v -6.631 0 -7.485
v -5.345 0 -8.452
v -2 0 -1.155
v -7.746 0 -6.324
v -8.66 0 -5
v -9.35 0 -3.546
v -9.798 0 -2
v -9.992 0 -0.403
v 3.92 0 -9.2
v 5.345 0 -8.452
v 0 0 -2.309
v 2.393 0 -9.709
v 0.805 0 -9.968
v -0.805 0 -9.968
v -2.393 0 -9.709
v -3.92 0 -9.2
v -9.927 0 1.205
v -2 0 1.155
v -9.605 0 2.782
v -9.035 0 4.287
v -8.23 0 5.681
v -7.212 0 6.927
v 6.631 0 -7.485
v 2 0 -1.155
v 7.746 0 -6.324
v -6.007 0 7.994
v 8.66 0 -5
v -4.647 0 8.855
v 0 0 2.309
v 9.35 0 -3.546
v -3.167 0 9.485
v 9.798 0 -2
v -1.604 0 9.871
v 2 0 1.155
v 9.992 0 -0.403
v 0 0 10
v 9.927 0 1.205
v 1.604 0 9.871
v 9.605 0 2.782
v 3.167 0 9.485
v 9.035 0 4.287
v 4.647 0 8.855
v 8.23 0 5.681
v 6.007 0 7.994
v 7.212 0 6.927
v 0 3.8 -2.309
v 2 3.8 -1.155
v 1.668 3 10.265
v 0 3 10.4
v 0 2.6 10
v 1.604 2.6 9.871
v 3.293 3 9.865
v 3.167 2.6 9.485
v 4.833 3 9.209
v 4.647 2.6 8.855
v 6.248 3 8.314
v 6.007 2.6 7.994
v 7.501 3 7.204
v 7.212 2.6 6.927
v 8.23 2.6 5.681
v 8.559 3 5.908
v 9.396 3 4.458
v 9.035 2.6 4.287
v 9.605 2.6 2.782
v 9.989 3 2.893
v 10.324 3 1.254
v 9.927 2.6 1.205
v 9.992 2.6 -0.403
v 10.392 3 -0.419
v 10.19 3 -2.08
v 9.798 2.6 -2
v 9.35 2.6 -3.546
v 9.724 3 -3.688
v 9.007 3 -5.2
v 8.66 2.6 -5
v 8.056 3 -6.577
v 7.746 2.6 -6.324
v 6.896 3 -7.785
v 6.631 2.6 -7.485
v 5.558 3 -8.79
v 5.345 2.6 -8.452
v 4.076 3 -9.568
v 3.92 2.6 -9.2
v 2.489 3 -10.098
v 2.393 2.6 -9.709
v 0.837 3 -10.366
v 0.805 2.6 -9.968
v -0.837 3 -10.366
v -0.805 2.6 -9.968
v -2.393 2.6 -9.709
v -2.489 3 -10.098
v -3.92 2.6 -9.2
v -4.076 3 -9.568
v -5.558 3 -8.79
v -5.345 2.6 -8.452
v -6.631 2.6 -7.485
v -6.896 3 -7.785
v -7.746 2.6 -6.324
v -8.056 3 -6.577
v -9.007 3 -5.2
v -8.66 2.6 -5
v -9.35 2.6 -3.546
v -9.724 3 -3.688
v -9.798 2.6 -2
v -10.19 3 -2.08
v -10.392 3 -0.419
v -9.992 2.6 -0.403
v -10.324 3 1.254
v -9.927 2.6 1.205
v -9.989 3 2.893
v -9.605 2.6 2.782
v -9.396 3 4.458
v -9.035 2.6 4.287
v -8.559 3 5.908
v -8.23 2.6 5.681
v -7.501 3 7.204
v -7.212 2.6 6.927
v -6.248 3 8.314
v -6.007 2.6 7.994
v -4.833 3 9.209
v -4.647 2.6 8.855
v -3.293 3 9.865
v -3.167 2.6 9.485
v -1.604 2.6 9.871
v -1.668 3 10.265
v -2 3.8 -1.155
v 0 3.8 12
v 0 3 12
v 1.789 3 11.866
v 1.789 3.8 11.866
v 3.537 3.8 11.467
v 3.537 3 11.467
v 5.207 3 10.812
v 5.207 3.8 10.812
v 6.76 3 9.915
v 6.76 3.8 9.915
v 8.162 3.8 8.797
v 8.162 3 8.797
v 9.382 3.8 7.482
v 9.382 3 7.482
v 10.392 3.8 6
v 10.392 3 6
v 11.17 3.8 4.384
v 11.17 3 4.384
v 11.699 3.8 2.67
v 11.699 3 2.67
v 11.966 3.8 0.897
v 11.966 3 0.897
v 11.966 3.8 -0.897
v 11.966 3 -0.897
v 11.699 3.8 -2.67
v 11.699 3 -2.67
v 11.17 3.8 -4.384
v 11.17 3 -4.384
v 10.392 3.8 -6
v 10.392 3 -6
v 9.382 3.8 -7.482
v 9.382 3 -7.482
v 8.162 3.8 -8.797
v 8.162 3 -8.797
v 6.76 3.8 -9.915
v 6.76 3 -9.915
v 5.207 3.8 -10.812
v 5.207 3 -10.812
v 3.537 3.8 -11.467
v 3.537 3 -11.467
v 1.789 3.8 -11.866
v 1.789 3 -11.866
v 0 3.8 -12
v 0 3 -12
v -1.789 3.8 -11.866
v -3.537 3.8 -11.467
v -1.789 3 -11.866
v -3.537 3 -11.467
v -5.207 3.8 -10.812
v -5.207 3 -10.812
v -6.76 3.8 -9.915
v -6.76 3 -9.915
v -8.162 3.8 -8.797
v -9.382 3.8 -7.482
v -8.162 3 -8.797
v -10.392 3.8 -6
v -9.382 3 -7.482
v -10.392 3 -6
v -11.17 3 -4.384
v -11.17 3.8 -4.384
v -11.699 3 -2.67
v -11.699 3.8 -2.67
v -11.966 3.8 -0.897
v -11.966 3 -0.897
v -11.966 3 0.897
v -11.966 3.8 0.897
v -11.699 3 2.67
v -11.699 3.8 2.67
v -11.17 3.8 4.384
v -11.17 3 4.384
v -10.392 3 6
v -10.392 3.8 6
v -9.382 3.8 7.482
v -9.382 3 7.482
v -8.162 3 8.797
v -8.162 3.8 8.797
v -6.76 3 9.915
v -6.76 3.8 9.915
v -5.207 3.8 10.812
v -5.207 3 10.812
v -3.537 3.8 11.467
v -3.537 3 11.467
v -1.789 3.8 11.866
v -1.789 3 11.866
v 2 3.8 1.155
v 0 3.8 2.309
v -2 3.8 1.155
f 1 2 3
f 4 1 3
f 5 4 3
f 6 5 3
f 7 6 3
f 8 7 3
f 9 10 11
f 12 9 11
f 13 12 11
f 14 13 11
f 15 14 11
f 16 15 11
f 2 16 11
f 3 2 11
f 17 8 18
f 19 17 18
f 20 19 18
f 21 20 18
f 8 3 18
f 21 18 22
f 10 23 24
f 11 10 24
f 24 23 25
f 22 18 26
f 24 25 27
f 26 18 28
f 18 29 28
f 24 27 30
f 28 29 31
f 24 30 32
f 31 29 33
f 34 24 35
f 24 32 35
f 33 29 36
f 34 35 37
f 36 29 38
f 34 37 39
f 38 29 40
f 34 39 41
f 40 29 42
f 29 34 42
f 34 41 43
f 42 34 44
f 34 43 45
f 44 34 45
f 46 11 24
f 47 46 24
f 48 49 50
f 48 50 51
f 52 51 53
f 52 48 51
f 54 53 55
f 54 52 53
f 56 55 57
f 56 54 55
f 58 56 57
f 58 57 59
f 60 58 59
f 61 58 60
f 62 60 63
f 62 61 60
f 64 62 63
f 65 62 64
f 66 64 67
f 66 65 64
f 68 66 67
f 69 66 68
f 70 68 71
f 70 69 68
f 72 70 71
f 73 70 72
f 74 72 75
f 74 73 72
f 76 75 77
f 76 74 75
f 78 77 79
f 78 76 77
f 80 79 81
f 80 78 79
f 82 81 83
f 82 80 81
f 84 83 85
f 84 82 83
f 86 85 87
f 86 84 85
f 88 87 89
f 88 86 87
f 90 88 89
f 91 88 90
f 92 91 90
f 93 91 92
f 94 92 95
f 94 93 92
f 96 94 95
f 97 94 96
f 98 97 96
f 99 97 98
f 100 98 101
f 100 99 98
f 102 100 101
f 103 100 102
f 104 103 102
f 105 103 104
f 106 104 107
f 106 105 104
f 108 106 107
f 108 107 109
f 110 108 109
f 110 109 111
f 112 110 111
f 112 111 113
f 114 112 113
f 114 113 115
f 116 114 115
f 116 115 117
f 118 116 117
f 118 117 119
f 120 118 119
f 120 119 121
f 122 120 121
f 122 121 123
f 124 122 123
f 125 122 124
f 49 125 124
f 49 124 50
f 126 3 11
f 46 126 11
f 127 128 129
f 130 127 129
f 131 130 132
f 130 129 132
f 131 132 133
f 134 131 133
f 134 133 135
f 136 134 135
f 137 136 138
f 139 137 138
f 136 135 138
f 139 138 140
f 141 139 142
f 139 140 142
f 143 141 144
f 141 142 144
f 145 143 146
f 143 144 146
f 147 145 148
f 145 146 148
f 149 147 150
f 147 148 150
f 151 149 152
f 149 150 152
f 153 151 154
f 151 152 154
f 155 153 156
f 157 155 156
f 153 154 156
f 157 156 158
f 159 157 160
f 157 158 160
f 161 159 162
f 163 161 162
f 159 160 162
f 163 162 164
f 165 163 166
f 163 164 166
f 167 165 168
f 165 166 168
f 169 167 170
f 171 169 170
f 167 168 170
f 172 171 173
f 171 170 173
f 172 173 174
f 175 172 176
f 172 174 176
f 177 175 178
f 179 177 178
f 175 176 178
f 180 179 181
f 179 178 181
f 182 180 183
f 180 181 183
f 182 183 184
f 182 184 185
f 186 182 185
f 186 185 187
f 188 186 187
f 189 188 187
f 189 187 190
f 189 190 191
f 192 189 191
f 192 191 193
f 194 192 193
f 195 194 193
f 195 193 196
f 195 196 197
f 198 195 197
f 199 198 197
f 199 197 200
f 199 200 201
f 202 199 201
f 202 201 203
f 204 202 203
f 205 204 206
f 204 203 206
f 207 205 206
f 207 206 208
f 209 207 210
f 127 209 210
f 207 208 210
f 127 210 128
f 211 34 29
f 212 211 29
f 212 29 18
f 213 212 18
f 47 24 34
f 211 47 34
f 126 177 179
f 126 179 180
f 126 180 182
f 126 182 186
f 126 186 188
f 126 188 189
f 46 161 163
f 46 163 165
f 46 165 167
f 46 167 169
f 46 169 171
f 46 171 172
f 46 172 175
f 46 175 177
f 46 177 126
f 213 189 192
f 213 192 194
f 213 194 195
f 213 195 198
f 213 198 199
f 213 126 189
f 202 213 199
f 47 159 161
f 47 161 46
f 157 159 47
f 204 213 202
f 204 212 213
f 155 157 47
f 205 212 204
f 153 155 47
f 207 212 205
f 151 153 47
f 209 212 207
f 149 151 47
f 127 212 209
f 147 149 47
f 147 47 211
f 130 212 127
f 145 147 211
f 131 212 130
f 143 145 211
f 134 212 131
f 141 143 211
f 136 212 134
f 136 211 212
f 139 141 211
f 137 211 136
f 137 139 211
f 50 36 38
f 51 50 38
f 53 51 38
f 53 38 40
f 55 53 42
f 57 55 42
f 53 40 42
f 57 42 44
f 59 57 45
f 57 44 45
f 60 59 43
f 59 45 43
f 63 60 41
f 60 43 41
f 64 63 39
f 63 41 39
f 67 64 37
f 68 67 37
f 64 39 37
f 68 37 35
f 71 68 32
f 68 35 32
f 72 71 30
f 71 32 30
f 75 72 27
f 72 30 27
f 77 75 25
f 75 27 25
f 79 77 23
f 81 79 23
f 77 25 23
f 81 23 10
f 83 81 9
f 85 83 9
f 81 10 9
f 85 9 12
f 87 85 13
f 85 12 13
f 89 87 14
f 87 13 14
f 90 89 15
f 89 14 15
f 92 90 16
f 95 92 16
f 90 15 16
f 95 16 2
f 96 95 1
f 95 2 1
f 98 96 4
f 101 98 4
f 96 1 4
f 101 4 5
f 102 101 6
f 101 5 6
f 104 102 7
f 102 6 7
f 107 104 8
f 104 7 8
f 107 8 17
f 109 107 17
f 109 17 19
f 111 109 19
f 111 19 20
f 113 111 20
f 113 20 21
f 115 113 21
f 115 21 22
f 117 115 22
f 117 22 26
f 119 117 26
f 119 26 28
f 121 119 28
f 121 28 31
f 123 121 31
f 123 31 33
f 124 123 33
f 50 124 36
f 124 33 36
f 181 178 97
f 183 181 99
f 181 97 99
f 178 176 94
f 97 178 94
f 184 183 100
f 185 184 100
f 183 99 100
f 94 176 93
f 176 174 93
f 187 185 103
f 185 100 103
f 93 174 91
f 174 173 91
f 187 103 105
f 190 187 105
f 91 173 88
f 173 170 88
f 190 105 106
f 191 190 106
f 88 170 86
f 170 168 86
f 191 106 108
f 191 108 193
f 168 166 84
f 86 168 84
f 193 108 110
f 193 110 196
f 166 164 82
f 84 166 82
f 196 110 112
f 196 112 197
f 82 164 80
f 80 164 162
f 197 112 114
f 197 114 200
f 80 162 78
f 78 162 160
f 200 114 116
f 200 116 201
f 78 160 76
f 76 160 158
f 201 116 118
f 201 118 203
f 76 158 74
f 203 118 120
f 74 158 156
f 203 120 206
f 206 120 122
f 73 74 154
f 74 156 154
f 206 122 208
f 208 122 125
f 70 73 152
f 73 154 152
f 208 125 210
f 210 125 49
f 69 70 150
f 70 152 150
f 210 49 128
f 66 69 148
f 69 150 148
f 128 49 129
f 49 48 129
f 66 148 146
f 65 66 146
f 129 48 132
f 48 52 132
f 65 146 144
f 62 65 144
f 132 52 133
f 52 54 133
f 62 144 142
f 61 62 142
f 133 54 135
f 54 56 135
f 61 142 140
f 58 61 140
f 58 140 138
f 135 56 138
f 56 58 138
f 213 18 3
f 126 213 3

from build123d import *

# Parameters (mm, degrees)
SKETCH1_R           = 10
BOSS_EXTRUDE1_DEPTH = 3
SKETCH3_R           = 12
BOSS_EXTRUDE2_DEPTH = 0.8
CUT_EXTRUDE1_DEPTH  = 18.390802167
CHAMFER1_SIZE       = 0.4


with BuildPart() as part:
    # Sketch1 → Boss-Extrude1 (new body)
    with BuildSketch(Plane(origin=(0, 0, 0), x_dir=(1, 0, 0), z_dir=(0, 1, 0))):
        with Locations(Location((0, 0, 0), (0, 0, 270))):
            Circle(SKETCH1_R)
        Polygon((0, 2.309401077), (-2, 1.154700538), (-2, -1.154700538), (0, -2.309401077), (2, -1.154700538), (2, 1.154700538), align=None, mode=Mode.SUBTRACT)
    extrude(amount=BOSS_EXTRUDE1_DEPTH)

    # Sketch3 → Boss-Extrude2 (add)
    with BuildSketch(Plane(origin=(0, 3, 0), x_dir=(1, 0, 0), z_dir=(0, 1, 0))):
        with Locations(Location((0, 0, 0), (0, 0, 270))):
            Circle(SKETCH3_R)
    extrude(amount=BOSS_EXTRUDE2_DEPTH)

    # Sketch4 → Cut-Extrude1 (cut, through all)
    with BuildSketch(Plane.XZ):
        Polygon((0, -2.309401077), (2, -1.154700538), (2, 1.154700538), (0, 2.309401077), (-2, 1.154700538), (-2, -1.154700538), align=None)
    extrude(amount=-CUT_EXTRUDE1_DEPTH, mode=Mode.SUBTRACT)

    # Chamfer1
    chamfer1_edges = [part.edges().sort_by_distance(p)[0] for p in [
        (0, 3, -10),
    ]]
    chamfer(chamfer1_edges, length=CHAMFER1_SIZE)


solid = part.part
